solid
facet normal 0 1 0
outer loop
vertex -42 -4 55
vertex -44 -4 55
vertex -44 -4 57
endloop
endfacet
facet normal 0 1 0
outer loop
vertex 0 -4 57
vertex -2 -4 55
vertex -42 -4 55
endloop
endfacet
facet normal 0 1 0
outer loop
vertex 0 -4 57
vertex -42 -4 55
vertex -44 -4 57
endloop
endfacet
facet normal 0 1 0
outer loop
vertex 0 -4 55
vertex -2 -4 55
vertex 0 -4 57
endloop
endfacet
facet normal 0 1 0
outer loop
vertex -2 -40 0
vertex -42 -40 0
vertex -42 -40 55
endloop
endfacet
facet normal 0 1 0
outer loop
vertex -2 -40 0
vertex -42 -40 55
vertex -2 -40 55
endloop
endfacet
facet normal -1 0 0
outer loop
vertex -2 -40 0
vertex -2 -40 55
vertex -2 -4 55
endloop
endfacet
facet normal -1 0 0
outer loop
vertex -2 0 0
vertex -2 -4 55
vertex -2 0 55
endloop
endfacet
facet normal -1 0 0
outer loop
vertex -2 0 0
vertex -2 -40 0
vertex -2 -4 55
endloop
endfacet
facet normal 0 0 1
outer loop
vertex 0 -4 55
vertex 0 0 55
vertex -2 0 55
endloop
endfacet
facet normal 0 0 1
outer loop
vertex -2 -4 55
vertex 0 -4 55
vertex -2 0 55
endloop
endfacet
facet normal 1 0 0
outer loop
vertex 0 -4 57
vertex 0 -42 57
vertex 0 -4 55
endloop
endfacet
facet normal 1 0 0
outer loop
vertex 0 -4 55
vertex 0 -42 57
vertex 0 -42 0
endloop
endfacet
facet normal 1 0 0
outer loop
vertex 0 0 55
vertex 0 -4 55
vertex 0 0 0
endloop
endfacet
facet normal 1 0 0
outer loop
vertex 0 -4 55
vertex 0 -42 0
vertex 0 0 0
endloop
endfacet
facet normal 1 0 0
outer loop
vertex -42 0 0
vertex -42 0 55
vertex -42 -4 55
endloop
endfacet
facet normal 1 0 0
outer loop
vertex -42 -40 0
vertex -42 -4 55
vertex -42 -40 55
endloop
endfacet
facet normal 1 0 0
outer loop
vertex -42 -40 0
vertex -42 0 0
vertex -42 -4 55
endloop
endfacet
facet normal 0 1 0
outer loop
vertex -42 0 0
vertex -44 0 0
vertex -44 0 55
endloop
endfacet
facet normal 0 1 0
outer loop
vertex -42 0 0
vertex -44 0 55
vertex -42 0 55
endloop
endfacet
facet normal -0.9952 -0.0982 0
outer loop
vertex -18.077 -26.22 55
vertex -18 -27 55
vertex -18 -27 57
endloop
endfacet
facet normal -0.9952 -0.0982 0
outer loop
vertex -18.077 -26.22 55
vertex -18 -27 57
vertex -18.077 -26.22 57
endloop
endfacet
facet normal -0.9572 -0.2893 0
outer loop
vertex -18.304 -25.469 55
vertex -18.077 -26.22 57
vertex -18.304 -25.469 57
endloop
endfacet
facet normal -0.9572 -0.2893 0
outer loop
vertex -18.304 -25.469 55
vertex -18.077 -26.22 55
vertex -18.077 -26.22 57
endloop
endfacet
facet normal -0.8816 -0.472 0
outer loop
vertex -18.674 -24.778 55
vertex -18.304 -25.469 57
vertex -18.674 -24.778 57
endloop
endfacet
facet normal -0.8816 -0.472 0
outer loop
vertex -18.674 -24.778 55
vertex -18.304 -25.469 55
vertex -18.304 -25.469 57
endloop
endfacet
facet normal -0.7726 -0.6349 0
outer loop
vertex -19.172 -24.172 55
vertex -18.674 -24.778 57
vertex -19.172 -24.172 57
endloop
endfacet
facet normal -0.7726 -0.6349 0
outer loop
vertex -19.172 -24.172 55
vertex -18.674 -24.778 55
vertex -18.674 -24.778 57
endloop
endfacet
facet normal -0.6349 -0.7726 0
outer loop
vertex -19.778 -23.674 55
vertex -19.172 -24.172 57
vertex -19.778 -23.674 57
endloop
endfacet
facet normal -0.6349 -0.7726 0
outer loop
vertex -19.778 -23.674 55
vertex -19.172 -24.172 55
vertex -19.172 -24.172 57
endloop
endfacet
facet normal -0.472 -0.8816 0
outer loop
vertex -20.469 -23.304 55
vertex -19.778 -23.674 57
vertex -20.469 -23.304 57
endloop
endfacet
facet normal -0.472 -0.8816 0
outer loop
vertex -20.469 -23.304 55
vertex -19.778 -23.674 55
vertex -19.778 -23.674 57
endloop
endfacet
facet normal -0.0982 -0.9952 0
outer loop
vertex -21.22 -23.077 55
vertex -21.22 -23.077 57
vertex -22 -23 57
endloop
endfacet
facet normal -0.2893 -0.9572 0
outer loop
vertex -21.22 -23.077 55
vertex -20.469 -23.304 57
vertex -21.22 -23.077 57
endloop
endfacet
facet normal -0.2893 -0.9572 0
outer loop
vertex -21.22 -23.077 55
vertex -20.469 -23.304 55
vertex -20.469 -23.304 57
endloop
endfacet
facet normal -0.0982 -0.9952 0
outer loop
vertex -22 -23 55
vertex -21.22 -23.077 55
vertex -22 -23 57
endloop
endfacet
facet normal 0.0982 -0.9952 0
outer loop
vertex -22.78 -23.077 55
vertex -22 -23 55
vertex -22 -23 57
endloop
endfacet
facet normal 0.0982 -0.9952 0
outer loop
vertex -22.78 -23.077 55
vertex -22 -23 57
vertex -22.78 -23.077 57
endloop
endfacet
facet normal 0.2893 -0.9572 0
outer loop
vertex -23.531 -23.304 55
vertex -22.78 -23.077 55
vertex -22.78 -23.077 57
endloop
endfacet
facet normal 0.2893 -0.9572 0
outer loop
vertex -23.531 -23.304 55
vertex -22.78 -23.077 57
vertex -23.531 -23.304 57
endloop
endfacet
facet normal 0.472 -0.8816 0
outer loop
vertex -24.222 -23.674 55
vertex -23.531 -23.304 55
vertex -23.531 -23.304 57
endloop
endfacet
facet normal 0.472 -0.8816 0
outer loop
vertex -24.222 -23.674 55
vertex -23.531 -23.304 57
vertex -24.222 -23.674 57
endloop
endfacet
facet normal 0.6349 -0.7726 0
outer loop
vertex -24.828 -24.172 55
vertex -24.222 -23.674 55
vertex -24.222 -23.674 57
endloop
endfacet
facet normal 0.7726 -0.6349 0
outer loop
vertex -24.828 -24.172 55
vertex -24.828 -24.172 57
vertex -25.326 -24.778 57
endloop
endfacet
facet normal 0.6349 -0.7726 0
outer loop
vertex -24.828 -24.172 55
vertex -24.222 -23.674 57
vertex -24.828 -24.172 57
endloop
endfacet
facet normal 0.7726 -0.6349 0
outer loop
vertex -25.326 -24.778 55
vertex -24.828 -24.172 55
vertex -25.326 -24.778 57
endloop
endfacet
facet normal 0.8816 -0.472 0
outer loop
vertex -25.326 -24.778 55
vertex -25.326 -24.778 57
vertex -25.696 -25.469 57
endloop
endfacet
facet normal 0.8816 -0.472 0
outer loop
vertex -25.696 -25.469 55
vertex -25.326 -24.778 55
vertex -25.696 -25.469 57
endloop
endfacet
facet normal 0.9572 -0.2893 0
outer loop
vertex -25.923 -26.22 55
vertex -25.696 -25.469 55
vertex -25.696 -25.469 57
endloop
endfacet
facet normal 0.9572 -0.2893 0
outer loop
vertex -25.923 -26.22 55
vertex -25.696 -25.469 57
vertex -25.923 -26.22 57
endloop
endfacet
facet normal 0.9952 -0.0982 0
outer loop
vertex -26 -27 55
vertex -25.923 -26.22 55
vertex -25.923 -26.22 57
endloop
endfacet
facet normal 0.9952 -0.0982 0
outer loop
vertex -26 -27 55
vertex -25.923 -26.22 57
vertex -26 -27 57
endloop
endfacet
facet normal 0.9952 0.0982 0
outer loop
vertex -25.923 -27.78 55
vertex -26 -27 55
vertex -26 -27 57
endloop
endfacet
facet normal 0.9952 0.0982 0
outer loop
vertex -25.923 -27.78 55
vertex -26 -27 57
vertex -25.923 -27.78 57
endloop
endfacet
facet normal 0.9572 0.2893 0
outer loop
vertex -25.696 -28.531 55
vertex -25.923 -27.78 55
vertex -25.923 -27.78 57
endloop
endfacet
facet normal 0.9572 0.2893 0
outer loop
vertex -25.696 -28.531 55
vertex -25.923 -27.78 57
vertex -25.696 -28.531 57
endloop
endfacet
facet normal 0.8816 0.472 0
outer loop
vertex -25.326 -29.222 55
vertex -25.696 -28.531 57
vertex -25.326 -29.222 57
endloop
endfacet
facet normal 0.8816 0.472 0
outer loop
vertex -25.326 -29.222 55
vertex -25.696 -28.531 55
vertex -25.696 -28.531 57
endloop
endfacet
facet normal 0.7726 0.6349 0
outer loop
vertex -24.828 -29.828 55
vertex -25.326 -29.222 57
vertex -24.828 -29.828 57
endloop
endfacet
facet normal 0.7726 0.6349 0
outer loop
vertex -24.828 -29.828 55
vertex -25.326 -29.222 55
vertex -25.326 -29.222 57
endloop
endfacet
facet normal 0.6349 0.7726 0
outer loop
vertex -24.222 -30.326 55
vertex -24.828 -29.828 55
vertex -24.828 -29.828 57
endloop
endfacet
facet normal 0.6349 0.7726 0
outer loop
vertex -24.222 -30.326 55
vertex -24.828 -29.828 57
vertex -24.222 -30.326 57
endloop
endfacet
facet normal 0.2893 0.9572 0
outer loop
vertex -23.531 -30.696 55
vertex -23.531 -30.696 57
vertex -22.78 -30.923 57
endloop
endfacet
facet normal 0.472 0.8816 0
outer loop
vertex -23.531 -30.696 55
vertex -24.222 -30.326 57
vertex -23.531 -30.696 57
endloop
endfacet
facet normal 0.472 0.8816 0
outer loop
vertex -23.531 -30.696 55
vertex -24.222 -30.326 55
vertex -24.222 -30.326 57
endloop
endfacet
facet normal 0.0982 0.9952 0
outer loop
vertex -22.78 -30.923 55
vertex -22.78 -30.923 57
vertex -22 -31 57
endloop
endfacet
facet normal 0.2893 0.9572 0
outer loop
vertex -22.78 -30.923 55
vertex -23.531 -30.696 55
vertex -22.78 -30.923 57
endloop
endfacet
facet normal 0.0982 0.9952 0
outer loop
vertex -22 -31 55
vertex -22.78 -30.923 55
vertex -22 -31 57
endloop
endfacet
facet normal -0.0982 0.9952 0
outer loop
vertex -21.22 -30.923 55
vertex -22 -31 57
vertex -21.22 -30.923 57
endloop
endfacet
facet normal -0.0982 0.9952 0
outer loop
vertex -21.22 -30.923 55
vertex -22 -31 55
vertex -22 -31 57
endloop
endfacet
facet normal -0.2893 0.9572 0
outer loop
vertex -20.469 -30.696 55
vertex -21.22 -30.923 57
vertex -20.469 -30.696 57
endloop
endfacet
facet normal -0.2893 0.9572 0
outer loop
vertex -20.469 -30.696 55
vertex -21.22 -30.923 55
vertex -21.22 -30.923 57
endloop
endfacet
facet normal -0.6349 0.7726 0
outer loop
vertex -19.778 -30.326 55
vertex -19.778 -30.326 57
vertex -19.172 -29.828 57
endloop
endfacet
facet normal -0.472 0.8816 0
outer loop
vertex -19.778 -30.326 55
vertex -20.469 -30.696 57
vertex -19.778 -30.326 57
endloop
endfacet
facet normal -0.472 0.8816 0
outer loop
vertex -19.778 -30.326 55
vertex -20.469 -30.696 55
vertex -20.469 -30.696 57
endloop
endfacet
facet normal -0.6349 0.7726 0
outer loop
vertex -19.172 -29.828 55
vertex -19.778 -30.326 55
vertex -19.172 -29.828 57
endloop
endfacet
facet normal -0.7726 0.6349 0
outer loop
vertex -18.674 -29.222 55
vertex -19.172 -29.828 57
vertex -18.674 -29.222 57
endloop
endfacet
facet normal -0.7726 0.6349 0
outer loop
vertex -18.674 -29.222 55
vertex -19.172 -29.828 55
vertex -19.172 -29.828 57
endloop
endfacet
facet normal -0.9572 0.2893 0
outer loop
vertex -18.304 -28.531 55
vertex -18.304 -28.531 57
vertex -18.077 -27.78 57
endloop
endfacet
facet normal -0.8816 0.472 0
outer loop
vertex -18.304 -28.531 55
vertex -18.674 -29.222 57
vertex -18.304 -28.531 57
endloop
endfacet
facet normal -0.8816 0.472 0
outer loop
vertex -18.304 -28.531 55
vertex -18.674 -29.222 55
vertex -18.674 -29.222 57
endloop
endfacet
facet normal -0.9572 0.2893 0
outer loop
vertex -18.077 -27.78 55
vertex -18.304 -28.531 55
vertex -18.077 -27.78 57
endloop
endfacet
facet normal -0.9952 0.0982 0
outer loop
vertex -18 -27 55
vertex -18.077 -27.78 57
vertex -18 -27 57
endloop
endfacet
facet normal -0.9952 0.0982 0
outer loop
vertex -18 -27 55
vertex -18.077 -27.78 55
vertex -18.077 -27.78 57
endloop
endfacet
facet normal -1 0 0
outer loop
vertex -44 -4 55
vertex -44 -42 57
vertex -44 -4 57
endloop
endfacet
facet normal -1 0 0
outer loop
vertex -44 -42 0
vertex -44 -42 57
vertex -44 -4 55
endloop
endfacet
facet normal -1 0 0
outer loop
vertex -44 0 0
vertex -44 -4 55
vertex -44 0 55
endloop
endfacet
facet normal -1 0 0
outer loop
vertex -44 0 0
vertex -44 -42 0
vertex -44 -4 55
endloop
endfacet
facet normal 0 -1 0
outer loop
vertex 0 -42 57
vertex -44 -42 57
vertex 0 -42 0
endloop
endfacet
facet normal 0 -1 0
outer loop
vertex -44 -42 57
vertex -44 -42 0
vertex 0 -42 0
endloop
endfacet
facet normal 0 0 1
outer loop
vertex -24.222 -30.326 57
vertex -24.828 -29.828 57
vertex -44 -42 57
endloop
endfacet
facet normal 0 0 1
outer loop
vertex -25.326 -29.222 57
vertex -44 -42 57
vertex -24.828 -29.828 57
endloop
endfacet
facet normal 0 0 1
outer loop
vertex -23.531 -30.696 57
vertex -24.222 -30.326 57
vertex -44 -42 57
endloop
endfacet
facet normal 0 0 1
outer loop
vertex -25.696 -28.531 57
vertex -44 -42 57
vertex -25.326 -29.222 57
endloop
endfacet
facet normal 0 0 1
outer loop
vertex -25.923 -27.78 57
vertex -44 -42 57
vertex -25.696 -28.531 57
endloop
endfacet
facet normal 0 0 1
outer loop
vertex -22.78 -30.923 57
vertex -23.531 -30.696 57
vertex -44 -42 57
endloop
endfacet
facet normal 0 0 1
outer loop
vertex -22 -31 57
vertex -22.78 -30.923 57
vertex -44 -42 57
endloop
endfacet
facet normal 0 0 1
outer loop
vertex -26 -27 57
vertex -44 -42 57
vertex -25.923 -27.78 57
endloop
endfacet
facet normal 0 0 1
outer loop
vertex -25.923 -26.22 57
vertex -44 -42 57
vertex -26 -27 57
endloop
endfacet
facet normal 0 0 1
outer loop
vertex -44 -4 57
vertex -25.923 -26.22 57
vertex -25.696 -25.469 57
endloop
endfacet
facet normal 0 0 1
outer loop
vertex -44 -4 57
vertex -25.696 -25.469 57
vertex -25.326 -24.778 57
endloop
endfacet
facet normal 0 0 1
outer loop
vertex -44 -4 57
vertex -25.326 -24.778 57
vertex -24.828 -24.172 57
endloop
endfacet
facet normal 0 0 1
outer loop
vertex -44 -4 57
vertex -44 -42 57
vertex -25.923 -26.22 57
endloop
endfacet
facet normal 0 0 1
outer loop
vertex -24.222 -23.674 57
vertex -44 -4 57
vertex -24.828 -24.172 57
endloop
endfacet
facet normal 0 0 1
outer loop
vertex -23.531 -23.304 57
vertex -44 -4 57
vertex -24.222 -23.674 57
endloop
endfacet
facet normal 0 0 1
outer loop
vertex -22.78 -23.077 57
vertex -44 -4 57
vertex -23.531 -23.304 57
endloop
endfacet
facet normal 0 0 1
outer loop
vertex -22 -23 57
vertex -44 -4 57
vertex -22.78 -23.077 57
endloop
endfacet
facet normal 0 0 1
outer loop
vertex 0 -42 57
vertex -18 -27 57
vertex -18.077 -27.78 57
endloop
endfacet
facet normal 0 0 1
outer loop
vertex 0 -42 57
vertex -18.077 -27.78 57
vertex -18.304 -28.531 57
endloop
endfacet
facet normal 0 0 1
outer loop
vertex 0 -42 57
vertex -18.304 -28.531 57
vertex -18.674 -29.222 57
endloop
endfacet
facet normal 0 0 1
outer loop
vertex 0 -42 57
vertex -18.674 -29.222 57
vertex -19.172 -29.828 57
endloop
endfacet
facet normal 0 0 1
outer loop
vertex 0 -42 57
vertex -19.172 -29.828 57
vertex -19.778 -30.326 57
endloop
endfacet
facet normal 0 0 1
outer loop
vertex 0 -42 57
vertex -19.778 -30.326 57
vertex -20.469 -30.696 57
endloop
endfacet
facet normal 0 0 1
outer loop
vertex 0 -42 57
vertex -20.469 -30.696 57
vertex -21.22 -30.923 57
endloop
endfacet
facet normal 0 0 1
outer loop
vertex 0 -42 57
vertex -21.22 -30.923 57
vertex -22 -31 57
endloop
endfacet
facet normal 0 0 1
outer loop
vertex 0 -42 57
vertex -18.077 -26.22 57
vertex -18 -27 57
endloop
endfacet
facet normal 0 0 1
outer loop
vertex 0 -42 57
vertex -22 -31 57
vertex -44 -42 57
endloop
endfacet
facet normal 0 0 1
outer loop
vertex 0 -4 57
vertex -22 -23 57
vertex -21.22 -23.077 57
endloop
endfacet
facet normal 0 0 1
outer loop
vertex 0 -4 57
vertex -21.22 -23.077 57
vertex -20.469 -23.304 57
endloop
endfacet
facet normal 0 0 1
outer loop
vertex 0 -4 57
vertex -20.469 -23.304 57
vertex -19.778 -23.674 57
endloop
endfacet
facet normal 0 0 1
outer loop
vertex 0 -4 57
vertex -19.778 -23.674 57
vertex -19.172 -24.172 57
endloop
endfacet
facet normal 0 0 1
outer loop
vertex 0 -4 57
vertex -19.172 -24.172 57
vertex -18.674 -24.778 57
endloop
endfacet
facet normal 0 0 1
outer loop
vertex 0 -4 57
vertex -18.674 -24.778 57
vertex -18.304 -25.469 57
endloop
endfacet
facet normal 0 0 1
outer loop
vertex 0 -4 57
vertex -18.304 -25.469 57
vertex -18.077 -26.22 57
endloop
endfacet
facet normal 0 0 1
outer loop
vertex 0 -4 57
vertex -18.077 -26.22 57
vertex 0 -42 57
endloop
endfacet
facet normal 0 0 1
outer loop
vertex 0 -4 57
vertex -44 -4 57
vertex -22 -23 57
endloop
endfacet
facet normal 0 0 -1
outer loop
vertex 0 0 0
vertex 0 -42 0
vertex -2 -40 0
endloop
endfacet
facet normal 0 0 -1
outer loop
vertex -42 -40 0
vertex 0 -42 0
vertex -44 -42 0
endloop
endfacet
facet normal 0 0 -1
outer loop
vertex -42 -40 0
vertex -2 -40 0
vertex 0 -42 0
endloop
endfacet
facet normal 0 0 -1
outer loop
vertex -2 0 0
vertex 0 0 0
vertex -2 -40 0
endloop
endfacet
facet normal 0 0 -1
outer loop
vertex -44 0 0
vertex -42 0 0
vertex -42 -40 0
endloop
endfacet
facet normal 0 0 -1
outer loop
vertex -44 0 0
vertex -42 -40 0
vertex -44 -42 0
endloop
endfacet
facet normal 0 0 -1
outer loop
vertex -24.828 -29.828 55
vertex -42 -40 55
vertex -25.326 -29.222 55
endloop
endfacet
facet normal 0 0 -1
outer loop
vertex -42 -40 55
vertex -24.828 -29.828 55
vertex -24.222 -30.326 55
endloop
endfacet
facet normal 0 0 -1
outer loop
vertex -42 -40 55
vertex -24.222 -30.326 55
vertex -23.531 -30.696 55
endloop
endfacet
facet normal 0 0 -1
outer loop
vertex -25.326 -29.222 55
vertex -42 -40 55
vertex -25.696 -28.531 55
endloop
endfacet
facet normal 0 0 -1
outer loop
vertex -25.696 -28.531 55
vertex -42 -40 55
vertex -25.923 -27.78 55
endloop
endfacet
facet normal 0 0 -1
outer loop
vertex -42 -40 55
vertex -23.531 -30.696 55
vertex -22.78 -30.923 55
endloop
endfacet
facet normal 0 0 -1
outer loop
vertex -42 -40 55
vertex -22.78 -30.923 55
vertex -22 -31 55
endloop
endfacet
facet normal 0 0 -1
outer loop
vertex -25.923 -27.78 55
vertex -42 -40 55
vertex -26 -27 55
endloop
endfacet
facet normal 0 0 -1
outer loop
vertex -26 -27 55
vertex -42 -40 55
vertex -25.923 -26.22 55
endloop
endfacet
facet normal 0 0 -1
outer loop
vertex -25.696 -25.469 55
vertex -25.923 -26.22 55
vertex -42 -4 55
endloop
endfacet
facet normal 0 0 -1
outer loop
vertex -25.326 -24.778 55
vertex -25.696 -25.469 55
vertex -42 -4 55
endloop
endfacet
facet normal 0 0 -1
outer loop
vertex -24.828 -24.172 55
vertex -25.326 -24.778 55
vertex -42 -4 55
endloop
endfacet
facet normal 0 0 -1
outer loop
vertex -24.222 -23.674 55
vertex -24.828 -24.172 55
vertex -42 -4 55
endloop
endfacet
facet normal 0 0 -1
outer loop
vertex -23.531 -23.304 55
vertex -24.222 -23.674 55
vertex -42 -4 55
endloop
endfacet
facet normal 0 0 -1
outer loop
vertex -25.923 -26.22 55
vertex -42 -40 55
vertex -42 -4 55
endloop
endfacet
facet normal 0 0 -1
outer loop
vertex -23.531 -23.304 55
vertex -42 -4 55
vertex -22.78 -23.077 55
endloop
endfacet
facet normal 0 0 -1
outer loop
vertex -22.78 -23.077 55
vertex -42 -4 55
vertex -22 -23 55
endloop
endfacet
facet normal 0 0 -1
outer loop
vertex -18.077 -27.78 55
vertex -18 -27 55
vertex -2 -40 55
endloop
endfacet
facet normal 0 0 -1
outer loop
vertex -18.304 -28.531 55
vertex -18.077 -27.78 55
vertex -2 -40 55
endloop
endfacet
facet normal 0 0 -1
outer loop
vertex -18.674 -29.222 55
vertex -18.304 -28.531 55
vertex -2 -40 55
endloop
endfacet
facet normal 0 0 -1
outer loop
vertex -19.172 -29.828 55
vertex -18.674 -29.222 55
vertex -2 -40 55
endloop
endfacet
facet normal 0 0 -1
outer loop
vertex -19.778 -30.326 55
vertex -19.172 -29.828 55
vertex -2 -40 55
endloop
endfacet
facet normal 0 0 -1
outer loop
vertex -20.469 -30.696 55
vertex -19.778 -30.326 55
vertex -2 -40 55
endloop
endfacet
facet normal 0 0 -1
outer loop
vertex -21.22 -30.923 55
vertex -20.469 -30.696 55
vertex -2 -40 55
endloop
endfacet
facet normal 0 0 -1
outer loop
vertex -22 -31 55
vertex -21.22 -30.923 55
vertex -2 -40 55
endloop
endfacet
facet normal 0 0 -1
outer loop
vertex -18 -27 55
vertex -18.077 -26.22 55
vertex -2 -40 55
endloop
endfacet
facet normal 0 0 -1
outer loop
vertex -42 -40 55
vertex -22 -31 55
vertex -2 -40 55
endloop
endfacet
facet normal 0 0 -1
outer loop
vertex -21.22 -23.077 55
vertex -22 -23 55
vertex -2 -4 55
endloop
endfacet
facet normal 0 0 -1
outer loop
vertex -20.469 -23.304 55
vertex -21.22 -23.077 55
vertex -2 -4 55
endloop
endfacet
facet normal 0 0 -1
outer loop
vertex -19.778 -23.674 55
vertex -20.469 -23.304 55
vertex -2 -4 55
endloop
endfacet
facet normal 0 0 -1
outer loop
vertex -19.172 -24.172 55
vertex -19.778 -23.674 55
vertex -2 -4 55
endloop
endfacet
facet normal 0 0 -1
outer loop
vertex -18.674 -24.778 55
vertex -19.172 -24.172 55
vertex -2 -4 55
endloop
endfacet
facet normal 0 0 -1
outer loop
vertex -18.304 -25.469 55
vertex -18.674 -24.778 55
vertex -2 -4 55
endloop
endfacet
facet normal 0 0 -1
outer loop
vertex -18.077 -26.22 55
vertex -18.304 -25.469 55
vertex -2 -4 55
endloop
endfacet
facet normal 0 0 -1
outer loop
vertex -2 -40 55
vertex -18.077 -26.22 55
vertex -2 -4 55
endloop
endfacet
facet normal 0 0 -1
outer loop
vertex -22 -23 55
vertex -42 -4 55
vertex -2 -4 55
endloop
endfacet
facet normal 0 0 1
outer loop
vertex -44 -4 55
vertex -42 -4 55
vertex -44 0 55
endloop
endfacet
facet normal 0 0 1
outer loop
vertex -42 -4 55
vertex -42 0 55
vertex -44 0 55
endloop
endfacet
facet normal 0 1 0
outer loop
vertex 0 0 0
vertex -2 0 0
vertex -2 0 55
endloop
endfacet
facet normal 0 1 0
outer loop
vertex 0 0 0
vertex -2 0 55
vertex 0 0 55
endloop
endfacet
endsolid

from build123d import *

# Parameters (mm, degrees)
BOSS_EXTRUDE1_DEPTH     = 55
SKETCH2_W               = 44
SKETCH2_H               = 38
BOSS_EXTRUDE2_DEPTH     = 2
CUT_EXTRUDE1_DEPTH      = 84.360662185
CUT_EXTRUDE1_DEPTH_BACK = 84.360662185
SKETCH3_R               = 4


with BuildPart() as part:
    # Sketch1 → Boss-Extrude1 (new body)
    with BuildSketch(Plane.XY):
        Polygon((0, 0), (0, -42), (-44, -42), (-44, 0), (-42, 0), (-42, -40), (-2, -40), (-2, 0), align=None)
    extrude(amount=BOSS_EXTRUDE1_DEPTH)

    # Sketch2 → Boss-Extrude2 (add)
    with BuildSketch(Plane.XY.offset(55)):
        with Locations((-22, -23)):
            Rectangle(SKETCH2_W, SKETCH2_H)
    extrude(amount=BOSS_EXTRUDE2_DEPTH)

    # Sketch3 → Cut-Extrude1 (cut, two sides: drawn at the far end of the back side and taken through both)
    with BuildSketch(Plane.XY.offset(57).offset(-CUT_EXTRUDE1_DEPTH_BACK)):
        with Locations((-22, -27)):
            Circle(SKETCH3_R)
    extrude(amount=CUT_EXTRUDE1_DEPTH + CUT_EXTRUDE1_DEPTH_BACK, mode=Mode.SUBTRACT)


solid = part.part
